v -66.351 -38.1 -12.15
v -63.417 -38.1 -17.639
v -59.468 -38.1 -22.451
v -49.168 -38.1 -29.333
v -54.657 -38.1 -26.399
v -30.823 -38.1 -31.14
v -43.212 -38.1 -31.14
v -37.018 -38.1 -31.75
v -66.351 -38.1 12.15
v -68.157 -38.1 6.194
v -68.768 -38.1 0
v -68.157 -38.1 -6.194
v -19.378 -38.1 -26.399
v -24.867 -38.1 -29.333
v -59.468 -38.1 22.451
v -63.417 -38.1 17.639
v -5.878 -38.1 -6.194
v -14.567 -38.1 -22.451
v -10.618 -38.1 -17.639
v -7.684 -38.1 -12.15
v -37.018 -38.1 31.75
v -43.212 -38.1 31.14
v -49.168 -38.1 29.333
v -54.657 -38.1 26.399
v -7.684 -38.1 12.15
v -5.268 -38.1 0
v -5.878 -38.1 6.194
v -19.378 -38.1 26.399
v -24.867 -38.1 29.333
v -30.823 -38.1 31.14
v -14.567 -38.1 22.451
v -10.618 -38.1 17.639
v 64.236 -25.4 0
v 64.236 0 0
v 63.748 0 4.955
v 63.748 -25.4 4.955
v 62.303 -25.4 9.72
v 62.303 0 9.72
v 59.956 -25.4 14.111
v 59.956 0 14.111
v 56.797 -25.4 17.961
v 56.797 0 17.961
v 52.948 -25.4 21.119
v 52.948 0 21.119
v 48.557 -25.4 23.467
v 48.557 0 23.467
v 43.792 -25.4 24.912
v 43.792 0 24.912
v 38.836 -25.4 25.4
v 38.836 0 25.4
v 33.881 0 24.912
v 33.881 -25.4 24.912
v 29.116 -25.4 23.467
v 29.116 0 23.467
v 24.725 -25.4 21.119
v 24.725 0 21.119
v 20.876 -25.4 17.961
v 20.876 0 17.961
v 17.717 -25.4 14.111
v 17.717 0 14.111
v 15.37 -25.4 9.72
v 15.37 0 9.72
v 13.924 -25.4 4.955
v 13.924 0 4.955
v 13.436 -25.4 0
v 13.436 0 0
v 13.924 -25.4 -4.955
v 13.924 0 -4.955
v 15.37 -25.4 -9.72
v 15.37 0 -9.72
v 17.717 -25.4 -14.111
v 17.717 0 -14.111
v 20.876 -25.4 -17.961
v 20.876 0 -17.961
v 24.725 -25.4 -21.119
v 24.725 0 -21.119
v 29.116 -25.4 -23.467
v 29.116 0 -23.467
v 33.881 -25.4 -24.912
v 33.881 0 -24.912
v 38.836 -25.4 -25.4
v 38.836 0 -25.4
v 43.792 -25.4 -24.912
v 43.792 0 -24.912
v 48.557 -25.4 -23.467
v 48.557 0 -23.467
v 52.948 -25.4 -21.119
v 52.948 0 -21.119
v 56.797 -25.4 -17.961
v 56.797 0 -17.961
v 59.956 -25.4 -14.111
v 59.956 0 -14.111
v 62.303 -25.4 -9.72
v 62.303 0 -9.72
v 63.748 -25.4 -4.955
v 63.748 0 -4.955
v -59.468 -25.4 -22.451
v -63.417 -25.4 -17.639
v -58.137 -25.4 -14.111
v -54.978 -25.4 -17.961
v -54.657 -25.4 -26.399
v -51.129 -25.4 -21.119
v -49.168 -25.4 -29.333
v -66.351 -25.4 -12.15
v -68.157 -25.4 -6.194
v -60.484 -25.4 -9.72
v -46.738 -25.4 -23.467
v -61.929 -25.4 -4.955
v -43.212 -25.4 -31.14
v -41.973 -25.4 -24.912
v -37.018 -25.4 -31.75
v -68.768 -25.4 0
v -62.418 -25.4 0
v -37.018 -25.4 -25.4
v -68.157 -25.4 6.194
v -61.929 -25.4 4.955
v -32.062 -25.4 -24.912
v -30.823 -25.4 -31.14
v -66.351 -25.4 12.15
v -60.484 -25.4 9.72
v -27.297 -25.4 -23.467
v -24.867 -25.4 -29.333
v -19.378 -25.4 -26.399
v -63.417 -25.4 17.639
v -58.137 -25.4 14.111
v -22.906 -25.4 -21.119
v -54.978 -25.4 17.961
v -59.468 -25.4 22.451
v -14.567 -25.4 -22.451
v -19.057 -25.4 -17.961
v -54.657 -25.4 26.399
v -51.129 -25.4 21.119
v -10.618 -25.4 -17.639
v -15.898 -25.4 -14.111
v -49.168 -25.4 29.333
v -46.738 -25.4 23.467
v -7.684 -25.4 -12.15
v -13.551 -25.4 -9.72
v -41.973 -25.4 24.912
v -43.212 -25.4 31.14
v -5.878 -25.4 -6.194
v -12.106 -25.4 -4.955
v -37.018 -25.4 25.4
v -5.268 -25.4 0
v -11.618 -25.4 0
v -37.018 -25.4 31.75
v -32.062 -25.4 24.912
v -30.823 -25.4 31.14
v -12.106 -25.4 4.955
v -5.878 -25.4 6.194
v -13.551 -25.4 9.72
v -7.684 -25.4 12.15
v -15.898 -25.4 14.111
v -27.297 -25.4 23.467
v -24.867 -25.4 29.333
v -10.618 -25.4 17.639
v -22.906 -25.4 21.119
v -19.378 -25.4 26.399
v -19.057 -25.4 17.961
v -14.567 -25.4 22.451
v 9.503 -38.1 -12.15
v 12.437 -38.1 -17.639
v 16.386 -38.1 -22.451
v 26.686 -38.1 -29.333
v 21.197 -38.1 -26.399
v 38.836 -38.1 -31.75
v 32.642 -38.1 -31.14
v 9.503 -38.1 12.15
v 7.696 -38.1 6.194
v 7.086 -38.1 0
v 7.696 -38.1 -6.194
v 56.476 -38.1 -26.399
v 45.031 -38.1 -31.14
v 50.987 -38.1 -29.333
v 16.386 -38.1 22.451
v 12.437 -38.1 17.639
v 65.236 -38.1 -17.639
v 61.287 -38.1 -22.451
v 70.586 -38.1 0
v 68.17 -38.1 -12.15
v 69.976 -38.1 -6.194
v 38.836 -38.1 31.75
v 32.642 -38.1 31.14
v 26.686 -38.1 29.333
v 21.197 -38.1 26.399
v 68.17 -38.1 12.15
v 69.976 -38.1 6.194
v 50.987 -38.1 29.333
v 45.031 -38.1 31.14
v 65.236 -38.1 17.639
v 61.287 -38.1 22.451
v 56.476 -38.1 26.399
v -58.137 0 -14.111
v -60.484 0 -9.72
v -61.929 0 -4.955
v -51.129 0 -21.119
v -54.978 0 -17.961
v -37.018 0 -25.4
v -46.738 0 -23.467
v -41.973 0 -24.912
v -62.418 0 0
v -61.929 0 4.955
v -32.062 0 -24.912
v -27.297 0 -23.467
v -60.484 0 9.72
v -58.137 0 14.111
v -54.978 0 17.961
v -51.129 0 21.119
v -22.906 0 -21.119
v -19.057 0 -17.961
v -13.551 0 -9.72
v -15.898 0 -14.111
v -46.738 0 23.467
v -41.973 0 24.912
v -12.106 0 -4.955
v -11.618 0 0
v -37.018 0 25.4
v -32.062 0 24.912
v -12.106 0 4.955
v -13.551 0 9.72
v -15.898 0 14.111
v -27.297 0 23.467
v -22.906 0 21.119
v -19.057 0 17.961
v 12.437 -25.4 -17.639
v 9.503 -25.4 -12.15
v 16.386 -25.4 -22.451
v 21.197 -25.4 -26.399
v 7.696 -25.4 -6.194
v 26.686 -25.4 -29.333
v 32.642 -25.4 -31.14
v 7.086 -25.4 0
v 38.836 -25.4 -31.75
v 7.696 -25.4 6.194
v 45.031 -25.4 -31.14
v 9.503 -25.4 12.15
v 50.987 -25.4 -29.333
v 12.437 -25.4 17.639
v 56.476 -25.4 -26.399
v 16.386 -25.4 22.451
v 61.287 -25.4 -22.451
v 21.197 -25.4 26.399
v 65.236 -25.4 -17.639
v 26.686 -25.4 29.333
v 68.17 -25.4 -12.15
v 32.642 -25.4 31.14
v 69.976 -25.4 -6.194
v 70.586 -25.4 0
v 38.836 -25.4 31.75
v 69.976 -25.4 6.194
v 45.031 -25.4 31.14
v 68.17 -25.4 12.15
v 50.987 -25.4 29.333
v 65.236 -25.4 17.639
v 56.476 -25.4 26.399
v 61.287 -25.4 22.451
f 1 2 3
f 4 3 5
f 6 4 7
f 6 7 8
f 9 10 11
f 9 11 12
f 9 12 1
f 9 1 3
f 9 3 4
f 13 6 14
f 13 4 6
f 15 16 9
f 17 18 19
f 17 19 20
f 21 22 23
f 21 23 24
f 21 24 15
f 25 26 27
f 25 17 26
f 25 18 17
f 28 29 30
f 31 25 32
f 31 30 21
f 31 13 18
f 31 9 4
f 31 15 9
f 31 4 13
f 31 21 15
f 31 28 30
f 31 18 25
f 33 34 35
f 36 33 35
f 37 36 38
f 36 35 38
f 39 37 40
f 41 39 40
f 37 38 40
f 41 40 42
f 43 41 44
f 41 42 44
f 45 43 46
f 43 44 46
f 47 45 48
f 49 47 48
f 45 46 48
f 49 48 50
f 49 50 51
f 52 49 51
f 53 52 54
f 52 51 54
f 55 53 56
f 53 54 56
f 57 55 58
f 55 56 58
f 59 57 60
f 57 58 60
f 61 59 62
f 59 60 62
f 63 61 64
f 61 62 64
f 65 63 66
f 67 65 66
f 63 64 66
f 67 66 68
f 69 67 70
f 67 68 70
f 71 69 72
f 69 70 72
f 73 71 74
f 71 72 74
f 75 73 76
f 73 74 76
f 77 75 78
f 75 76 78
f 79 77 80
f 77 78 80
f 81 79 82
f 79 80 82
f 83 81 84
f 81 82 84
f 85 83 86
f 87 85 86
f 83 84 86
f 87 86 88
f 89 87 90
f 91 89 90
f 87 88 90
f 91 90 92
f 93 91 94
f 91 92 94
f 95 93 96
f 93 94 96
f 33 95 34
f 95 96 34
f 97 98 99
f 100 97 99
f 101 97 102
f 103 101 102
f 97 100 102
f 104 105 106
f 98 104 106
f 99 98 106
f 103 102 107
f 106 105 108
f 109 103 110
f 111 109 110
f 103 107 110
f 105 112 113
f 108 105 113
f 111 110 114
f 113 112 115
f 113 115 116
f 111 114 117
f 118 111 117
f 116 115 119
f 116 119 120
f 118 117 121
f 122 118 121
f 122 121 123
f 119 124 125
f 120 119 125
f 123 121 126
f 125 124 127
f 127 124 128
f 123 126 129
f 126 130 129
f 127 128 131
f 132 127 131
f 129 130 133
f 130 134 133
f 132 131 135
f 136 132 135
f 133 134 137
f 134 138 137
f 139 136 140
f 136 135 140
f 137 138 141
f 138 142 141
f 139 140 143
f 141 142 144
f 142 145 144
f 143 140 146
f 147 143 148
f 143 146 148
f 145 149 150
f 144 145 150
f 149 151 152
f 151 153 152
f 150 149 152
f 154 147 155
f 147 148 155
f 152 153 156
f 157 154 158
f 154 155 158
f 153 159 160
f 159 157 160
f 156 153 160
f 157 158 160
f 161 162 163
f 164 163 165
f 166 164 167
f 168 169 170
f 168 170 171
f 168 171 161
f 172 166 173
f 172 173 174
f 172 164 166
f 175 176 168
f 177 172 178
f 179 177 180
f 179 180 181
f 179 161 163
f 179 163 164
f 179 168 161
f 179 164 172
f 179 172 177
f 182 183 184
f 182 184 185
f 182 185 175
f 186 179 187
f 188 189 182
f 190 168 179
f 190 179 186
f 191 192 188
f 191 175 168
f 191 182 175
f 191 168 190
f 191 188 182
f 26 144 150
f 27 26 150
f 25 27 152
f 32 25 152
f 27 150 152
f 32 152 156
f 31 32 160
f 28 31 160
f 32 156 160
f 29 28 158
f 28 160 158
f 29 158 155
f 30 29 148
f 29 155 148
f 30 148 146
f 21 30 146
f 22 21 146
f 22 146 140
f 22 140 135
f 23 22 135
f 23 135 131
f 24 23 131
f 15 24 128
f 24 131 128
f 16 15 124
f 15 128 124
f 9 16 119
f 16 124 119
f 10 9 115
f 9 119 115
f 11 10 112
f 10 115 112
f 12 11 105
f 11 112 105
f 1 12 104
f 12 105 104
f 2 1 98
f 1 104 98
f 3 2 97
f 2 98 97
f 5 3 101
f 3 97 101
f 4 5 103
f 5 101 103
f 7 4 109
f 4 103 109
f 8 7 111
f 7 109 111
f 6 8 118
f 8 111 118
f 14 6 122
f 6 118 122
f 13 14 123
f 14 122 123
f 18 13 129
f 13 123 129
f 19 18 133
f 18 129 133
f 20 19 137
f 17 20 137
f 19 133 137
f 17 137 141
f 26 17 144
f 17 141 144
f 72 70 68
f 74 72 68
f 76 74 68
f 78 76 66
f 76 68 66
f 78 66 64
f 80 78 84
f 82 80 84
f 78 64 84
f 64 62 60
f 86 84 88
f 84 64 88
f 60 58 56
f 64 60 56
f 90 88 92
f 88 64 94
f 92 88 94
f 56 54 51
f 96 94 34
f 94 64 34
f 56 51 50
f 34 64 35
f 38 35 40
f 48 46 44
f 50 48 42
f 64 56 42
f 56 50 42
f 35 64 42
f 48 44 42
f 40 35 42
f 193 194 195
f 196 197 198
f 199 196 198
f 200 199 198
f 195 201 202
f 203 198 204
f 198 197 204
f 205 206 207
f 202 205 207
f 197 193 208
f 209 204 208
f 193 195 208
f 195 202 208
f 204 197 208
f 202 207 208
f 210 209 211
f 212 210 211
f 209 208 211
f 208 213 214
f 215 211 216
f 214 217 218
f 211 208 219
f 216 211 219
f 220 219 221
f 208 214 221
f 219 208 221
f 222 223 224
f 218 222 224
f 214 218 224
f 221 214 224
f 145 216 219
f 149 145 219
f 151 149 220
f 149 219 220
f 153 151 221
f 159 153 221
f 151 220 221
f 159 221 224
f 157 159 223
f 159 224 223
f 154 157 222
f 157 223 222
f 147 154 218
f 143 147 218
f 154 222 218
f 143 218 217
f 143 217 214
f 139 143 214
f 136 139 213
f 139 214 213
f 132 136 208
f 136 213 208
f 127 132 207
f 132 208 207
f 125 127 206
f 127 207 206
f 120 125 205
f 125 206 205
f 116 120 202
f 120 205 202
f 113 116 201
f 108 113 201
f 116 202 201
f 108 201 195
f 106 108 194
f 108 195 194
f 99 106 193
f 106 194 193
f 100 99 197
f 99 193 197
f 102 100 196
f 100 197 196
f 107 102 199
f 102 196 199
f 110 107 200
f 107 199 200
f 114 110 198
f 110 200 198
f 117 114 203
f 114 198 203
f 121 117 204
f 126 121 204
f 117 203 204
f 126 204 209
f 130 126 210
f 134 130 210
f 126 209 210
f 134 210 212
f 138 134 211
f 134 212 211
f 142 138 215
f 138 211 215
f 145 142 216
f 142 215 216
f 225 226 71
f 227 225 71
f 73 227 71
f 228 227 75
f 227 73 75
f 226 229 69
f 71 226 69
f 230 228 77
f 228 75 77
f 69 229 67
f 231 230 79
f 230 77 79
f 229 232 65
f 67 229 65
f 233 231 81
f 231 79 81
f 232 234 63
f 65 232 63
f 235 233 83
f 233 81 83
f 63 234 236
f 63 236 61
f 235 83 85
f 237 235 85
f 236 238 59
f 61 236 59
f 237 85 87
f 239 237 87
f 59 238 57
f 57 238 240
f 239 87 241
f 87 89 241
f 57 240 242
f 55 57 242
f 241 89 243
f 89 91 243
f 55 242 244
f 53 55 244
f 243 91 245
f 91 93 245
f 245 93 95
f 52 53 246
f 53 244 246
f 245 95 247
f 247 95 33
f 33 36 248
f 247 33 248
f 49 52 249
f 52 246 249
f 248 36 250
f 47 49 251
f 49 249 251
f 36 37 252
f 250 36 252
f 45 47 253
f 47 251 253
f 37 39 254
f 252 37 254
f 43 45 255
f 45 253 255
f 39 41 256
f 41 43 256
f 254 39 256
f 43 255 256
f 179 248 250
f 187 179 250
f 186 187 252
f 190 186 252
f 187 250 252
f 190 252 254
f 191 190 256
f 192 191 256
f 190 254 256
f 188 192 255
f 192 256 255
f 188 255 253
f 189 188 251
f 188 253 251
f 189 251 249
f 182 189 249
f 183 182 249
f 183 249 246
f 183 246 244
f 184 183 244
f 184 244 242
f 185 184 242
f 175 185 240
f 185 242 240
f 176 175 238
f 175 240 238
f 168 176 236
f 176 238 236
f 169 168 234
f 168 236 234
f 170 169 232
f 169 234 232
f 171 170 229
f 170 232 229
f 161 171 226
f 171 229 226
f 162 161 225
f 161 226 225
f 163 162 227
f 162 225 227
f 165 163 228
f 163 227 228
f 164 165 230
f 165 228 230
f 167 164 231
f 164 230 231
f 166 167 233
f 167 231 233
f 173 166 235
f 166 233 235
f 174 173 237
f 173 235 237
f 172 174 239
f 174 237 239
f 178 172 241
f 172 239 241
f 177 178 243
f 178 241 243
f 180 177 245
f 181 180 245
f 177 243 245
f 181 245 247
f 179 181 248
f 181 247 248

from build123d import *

# Parameters (mm, degrees)
F0_R     = 25.4
F1_DEPTH = 25.4
F2_R     = 31.75
F3_DEPTH = 12.7
F4_R     = 31.75
F5_DEPTH = 12.7


with BuildPart() as f1:
    # F0 (on Front) → F1 (new body)
    with BuildSketch(Plane.XZ):
        with Locations((-37.017502, 0)):
            Circle(F0_R)
        with Locations((38.83642, 0)):
            Circle(F0_R)
    extrude(amount=F1_DEPTH)

    # F2 (on face) → F3 (join)
    with BuildSketch(Plane.XZ.offset(25.4)):
        with Locations((-37.017502, 0)):
            Circle(F2_R)
    extrude(amount=F3_DEPTH)

    # F4 (on face) → F5 (join)
    with BuildSketch(Plane.XZ.offset(25.4)):
        with Locations((38.83642, 0)):
            Circle(F4_R)
    extrude(amount=F5_DEPTH)


solid = f1.part
